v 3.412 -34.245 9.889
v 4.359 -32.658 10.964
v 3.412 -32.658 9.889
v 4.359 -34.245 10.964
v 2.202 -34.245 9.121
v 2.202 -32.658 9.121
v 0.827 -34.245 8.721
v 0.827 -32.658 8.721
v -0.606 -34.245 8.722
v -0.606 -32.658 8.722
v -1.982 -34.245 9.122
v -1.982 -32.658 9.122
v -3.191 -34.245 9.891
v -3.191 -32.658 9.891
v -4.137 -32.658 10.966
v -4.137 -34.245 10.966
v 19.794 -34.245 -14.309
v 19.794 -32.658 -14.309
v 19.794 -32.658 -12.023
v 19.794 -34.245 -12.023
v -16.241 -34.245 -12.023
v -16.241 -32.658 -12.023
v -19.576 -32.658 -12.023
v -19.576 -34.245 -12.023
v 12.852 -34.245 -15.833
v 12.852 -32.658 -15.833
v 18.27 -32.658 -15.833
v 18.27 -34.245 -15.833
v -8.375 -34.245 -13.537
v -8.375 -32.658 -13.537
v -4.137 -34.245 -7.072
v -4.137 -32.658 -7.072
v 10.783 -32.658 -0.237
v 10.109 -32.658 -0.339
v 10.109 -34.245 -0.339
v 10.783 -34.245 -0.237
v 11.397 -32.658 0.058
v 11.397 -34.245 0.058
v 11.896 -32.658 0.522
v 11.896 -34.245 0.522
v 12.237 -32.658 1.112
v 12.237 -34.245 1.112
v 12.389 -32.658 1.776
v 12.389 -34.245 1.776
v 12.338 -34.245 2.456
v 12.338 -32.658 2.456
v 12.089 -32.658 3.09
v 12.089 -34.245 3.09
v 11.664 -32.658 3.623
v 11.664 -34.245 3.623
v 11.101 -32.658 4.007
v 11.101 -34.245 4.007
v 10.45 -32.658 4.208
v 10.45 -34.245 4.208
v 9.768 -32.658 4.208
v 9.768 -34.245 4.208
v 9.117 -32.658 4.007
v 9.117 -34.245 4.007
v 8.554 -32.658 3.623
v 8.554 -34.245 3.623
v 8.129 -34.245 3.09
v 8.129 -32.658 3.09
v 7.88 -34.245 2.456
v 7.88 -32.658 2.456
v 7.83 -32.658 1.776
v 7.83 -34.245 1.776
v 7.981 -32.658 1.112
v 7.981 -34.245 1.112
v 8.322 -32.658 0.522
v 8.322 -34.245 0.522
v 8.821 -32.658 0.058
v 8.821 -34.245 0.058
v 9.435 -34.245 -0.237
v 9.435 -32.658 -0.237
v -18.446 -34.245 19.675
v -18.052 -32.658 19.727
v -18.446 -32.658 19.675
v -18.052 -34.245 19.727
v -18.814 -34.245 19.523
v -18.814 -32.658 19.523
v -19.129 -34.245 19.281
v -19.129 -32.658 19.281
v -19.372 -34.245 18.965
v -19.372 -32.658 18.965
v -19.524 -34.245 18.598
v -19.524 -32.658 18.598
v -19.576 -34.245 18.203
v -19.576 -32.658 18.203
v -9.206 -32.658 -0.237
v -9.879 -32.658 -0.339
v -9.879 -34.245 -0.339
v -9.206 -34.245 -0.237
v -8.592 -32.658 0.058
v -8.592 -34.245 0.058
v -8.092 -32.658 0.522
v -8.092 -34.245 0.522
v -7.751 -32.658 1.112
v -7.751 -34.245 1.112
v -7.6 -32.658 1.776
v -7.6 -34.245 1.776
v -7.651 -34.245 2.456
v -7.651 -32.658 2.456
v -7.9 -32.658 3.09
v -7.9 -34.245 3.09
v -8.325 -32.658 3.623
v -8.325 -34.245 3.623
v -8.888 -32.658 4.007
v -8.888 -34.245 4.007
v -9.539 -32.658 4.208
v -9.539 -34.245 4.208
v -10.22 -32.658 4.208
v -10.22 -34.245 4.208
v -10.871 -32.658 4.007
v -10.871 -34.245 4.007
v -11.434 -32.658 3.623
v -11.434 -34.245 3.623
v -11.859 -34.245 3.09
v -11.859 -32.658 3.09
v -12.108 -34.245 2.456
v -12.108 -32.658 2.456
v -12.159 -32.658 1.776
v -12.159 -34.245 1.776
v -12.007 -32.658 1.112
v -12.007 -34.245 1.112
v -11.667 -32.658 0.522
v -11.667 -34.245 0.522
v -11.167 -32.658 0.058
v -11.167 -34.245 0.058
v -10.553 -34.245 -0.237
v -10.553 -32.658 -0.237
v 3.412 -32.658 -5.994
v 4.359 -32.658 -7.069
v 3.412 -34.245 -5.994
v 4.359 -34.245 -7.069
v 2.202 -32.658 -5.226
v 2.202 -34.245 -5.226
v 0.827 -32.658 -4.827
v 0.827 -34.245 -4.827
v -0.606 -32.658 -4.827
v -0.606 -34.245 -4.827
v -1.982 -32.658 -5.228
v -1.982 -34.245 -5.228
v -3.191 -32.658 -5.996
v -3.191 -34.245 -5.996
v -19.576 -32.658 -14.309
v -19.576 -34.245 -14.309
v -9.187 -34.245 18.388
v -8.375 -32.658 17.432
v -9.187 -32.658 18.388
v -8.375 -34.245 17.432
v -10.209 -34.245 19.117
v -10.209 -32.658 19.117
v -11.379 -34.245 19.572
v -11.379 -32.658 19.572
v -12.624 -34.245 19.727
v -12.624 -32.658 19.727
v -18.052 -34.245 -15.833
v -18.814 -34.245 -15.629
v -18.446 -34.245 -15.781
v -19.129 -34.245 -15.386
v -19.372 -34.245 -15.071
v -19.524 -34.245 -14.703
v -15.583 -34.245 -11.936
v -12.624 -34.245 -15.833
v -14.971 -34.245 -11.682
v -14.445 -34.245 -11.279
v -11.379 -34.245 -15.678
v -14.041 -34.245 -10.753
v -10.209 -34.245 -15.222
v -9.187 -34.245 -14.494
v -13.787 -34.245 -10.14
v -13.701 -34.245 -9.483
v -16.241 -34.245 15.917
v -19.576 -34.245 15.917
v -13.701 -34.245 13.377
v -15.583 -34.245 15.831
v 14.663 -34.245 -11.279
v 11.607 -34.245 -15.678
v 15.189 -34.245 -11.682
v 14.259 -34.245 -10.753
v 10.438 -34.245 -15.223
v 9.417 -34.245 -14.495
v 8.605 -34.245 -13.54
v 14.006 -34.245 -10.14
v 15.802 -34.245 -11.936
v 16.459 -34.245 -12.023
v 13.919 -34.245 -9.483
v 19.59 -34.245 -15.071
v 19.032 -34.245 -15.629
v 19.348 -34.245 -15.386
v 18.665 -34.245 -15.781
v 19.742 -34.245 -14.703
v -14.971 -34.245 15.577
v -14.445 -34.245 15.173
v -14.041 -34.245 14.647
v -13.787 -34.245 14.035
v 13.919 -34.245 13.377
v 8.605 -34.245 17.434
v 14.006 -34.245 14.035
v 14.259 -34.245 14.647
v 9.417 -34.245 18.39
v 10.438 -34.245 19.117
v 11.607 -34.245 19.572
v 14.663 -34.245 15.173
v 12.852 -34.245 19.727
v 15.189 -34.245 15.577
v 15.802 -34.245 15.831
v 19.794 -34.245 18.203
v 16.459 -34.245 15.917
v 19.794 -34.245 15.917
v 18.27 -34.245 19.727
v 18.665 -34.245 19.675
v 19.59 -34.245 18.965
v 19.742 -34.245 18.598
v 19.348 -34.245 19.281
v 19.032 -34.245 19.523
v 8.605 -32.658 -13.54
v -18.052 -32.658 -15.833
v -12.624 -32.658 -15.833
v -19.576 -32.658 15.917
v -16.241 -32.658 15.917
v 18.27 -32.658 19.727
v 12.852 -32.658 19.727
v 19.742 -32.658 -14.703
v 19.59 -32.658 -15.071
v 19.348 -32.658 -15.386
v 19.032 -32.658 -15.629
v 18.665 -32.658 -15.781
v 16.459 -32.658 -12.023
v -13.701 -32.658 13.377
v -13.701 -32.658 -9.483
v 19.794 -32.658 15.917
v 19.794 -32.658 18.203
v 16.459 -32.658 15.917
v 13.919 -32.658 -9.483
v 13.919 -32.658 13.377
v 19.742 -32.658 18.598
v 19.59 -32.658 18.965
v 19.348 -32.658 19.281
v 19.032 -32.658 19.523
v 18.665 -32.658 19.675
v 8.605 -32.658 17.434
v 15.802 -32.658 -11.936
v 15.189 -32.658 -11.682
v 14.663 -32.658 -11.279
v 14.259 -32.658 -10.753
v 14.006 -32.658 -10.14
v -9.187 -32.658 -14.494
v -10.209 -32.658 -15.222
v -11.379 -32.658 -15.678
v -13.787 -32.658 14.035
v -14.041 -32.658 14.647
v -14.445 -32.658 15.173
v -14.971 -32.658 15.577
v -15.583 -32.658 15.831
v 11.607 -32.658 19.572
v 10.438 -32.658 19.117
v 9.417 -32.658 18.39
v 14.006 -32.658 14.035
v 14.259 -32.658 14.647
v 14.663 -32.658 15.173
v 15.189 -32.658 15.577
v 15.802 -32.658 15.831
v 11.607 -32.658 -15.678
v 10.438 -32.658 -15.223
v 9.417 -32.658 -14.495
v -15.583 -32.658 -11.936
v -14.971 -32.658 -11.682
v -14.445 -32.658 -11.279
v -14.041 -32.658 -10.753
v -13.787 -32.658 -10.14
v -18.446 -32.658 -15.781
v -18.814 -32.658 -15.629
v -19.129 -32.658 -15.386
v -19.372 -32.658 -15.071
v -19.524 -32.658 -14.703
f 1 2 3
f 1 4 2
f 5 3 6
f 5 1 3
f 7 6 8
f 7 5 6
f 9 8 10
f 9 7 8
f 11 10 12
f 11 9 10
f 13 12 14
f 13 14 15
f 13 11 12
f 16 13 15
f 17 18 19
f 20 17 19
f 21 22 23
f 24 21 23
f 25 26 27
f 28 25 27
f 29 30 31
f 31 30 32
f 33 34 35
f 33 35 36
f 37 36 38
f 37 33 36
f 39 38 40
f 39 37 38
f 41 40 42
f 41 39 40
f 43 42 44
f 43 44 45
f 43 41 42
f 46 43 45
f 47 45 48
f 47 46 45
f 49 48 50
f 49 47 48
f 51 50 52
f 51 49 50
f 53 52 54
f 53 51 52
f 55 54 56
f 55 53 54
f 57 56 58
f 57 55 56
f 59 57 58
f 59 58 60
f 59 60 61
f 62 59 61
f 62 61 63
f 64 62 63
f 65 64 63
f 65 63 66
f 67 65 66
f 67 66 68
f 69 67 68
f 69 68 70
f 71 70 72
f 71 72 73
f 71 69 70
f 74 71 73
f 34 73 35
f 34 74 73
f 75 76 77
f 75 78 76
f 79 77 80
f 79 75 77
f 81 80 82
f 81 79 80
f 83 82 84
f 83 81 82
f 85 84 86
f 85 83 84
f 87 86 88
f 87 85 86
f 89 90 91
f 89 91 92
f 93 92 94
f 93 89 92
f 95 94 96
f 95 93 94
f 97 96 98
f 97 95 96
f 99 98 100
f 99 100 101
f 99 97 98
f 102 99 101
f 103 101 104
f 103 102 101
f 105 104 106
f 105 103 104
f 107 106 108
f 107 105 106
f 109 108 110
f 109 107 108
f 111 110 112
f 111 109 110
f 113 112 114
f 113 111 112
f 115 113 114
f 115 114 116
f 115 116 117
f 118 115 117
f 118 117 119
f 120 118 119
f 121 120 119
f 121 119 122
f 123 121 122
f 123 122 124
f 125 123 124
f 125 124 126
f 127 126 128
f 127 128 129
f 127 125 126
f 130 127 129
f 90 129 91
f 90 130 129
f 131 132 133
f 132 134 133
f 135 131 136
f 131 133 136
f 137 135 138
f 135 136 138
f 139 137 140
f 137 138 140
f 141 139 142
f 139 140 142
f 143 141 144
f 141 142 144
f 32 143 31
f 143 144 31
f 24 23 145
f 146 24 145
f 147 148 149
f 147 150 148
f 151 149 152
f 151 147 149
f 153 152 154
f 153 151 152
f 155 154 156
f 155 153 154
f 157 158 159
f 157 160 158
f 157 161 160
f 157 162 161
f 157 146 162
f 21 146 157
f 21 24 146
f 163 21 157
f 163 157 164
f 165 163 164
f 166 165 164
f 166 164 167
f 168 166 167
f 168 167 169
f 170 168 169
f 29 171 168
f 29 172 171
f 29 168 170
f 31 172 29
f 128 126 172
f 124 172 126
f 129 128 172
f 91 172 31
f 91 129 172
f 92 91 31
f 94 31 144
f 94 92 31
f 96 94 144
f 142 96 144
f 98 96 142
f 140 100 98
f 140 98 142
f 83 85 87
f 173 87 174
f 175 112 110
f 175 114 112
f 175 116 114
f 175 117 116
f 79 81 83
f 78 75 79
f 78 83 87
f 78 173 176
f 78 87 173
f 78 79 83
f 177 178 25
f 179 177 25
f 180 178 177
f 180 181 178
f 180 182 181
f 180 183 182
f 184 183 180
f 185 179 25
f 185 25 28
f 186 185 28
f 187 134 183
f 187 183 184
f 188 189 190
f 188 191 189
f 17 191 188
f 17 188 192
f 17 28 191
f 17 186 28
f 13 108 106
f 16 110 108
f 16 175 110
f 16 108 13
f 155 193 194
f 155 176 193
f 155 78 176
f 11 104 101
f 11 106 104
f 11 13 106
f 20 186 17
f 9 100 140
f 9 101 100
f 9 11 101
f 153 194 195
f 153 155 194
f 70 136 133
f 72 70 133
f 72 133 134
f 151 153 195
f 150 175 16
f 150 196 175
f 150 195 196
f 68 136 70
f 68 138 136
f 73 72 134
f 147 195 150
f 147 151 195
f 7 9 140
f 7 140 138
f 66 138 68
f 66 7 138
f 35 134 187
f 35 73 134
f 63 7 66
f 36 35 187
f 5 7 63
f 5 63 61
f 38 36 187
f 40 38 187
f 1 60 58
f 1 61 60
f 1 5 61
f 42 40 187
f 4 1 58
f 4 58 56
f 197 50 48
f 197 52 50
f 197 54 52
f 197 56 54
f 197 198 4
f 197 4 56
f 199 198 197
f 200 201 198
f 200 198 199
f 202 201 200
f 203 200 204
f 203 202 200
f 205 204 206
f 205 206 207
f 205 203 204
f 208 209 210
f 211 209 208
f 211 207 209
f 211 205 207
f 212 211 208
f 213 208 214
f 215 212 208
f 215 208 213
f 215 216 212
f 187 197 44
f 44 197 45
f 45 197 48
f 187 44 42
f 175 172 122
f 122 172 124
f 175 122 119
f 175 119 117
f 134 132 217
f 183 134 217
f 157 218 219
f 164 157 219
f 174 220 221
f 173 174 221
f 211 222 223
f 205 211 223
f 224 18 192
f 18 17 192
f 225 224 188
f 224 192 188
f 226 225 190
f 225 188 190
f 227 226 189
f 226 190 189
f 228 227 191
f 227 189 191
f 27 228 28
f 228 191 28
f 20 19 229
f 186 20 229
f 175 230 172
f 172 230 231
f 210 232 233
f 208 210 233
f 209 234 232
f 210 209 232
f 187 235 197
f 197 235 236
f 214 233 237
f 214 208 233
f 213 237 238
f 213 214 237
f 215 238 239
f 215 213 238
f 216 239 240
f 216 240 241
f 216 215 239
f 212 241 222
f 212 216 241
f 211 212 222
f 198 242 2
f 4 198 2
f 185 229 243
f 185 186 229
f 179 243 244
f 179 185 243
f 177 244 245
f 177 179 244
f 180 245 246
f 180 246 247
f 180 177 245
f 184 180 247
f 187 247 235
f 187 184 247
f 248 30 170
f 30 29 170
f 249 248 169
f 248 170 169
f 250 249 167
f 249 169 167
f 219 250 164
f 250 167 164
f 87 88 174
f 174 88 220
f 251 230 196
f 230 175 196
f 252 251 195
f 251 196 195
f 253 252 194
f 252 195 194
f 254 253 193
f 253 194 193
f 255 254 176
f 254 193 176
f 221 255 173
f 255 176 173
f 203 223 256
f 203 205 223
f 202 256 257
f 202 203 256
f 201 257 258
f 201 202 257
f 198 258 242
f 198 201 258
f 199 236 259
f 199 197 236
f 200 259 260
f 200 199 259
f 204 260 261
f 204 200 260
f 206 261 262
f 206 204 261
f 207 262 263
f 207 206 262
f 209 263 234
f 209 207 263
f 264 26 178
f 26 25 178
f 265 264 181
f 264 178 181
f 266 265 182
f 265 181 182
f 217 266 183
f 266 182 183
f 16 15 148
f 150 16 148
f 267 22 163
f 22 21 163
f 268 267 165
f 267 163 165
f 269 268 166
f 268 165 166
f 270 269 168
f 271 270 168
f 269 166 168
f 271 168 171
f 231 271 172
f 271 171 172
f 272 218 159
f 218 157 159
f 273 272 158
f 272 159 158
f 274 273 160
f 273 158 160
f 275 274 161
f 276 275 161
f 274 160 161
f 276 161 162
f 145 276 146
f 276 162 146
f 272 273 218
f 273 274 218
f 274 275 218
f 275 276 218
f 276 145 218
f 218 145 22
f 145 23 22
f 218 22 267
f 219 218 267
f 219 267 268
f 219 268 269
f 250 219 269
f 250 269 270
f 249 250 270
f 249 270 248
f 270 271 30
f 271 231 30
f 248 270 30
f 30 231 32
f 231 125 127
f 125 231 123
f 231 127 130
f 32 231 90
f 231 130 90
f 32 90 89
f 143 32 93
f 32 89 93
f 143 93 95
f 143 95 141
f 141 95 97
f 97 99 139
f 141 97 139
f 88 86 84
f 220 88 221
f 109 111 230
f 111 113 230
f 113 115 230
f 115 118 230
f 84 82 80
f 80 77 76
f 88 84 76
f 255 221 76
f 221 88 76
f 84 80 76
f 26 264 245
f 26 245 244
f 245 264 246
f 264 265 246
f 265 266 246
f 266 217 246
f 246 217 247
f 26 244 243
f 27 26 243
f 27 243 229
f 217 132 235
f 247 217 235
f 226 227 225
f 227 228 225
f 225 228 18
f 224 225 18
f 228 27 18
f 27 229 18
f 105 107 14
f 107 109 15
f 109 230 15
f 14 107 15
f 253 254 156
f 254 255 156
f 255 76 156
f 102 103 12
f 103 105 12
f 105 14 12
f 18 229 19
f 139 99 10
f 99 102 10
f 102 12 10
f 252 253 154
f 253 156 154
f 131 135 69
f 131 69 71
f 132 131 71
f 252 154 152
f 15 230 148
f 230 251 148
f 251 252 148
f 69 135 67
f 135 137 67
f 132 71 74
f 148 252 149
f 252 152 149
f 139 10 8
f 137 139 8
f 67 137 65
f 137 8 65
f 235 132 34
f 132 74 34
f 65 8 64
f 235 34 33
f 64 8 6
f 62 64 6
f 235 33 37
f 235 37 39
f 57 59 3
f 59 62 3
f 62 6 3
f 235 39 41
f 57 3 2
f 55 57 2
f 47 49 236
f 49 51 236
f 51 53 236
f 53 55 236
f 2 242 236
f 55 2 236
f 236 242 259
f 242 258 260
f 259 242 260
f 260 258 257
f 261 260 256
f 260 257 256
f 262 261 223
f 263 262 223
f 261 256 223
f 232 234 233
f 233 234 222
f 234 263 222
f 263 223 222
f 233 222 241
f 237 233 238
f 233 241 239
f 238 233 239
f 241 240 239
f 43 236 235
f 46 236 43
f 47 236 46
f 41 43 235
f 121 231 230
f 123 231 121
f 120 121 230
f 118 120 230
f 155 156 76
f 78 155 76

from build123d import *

# Parameters (mm, degrees)
SKETCH2_R           = 2.286
BOSS_EXTRUDE1_DEPTH = 1.5875
FILLET1_R           = 5.08
FILLET2_R           = 2.54
FILLET3_R           = 1.524


with BuildPart() as part:
    # Sketch2 → Boss-Extrude1 (new body)
    with BuildSketch(Plane.XZ.offset(32.657932219)):
        Polygon((10.109157694, -15.832760328), (13.919157694, -15.832760328), (19.794157694, -15.832760328), (19.794157694, -12.022760328), (13.919157694, -12.022760328), (13.919157694, 15.917239672), (19.794157694, 15.917239672), (19.794157694, 19.727239672), (13.919157694, 19.727239672), (10.109157694, 19.727239672), (0.109157694, 4.487239672), (-9.879450107, 19.727239672), (-13.700842306, 19.727239672), (-19.575842306, 19.727239672), (-19.575842306, 15.917239672), (-13.700842306, 15.917239672), (-13.700842306, -12.022760328), (-19.575842306, -12.022760328), (-19.575842306, -15.832760328), (-13.700842306, -15.832760328), (-9.879450107, -15.832760328), (0.109157694, -0.592760328), align=None)
        with Locations(Location((-9.879450107, 1.947239672, 0), (0, 0, 270))):
            Circle(SKETCH2_R, mode=Mode.SUBTRACT)
        with Locations(Location((10.109157694, 1.947239672, 0), (0, 0, 270))):
            Circle(SKETCH2_R, mode=Mode.SUBTRACT)
    extrude(amount=BOSS_EXTRUDE1_DEPTH)

    # Fillet1
    fillet1_edges = [part.edges().sort_by_distance(p)[0] for p in [
        (10.109157694, -33.451682219, 19.727239672),
        (10.109157694, -33.451682219, -15.832760328),
        (0.109157694, -33.451682219, -0.592760328),
        (-9.879450107, -33.451682219, -15.832760328),
        (-9.879450107, -33.451682219, 19.727239672),
        (0.109157694, -33.451682219, 4.487239672),
    ]]
    fillet(fillet1_edges, radius=FILLET1_R)

    # Fillet2
    fillet2_edges = [part.edges().sort_by_distance(p)[0] for p in [
        (13.919157694, -33.451682219, 15.917239672),
        (13.919157694, -33.451682219, -12.022760328),
        (-13.700842306, -33.451682219, -12.022760328),
        (-13.700842306, -33.451682219, 15.917239672),
    ]]
    fillet(fillet2_edges, radius=FILLET2_R)

    # Fillet3
    fillet3_edges = [part.edges().sort_by_distance(p)[0] for p in [
        (19.794157694, -33.451682219, 19.727239672),
        (19.794157694, -33.451682219, -15.832760328),
        (-19.575842306, -33.451682219, -15.832760328),
        (-19.575842306, -33.451682219, 19.727239672),
    ]]
    fillet(fillet3_edges, radius=FILLET3_R)


solid = part.part
